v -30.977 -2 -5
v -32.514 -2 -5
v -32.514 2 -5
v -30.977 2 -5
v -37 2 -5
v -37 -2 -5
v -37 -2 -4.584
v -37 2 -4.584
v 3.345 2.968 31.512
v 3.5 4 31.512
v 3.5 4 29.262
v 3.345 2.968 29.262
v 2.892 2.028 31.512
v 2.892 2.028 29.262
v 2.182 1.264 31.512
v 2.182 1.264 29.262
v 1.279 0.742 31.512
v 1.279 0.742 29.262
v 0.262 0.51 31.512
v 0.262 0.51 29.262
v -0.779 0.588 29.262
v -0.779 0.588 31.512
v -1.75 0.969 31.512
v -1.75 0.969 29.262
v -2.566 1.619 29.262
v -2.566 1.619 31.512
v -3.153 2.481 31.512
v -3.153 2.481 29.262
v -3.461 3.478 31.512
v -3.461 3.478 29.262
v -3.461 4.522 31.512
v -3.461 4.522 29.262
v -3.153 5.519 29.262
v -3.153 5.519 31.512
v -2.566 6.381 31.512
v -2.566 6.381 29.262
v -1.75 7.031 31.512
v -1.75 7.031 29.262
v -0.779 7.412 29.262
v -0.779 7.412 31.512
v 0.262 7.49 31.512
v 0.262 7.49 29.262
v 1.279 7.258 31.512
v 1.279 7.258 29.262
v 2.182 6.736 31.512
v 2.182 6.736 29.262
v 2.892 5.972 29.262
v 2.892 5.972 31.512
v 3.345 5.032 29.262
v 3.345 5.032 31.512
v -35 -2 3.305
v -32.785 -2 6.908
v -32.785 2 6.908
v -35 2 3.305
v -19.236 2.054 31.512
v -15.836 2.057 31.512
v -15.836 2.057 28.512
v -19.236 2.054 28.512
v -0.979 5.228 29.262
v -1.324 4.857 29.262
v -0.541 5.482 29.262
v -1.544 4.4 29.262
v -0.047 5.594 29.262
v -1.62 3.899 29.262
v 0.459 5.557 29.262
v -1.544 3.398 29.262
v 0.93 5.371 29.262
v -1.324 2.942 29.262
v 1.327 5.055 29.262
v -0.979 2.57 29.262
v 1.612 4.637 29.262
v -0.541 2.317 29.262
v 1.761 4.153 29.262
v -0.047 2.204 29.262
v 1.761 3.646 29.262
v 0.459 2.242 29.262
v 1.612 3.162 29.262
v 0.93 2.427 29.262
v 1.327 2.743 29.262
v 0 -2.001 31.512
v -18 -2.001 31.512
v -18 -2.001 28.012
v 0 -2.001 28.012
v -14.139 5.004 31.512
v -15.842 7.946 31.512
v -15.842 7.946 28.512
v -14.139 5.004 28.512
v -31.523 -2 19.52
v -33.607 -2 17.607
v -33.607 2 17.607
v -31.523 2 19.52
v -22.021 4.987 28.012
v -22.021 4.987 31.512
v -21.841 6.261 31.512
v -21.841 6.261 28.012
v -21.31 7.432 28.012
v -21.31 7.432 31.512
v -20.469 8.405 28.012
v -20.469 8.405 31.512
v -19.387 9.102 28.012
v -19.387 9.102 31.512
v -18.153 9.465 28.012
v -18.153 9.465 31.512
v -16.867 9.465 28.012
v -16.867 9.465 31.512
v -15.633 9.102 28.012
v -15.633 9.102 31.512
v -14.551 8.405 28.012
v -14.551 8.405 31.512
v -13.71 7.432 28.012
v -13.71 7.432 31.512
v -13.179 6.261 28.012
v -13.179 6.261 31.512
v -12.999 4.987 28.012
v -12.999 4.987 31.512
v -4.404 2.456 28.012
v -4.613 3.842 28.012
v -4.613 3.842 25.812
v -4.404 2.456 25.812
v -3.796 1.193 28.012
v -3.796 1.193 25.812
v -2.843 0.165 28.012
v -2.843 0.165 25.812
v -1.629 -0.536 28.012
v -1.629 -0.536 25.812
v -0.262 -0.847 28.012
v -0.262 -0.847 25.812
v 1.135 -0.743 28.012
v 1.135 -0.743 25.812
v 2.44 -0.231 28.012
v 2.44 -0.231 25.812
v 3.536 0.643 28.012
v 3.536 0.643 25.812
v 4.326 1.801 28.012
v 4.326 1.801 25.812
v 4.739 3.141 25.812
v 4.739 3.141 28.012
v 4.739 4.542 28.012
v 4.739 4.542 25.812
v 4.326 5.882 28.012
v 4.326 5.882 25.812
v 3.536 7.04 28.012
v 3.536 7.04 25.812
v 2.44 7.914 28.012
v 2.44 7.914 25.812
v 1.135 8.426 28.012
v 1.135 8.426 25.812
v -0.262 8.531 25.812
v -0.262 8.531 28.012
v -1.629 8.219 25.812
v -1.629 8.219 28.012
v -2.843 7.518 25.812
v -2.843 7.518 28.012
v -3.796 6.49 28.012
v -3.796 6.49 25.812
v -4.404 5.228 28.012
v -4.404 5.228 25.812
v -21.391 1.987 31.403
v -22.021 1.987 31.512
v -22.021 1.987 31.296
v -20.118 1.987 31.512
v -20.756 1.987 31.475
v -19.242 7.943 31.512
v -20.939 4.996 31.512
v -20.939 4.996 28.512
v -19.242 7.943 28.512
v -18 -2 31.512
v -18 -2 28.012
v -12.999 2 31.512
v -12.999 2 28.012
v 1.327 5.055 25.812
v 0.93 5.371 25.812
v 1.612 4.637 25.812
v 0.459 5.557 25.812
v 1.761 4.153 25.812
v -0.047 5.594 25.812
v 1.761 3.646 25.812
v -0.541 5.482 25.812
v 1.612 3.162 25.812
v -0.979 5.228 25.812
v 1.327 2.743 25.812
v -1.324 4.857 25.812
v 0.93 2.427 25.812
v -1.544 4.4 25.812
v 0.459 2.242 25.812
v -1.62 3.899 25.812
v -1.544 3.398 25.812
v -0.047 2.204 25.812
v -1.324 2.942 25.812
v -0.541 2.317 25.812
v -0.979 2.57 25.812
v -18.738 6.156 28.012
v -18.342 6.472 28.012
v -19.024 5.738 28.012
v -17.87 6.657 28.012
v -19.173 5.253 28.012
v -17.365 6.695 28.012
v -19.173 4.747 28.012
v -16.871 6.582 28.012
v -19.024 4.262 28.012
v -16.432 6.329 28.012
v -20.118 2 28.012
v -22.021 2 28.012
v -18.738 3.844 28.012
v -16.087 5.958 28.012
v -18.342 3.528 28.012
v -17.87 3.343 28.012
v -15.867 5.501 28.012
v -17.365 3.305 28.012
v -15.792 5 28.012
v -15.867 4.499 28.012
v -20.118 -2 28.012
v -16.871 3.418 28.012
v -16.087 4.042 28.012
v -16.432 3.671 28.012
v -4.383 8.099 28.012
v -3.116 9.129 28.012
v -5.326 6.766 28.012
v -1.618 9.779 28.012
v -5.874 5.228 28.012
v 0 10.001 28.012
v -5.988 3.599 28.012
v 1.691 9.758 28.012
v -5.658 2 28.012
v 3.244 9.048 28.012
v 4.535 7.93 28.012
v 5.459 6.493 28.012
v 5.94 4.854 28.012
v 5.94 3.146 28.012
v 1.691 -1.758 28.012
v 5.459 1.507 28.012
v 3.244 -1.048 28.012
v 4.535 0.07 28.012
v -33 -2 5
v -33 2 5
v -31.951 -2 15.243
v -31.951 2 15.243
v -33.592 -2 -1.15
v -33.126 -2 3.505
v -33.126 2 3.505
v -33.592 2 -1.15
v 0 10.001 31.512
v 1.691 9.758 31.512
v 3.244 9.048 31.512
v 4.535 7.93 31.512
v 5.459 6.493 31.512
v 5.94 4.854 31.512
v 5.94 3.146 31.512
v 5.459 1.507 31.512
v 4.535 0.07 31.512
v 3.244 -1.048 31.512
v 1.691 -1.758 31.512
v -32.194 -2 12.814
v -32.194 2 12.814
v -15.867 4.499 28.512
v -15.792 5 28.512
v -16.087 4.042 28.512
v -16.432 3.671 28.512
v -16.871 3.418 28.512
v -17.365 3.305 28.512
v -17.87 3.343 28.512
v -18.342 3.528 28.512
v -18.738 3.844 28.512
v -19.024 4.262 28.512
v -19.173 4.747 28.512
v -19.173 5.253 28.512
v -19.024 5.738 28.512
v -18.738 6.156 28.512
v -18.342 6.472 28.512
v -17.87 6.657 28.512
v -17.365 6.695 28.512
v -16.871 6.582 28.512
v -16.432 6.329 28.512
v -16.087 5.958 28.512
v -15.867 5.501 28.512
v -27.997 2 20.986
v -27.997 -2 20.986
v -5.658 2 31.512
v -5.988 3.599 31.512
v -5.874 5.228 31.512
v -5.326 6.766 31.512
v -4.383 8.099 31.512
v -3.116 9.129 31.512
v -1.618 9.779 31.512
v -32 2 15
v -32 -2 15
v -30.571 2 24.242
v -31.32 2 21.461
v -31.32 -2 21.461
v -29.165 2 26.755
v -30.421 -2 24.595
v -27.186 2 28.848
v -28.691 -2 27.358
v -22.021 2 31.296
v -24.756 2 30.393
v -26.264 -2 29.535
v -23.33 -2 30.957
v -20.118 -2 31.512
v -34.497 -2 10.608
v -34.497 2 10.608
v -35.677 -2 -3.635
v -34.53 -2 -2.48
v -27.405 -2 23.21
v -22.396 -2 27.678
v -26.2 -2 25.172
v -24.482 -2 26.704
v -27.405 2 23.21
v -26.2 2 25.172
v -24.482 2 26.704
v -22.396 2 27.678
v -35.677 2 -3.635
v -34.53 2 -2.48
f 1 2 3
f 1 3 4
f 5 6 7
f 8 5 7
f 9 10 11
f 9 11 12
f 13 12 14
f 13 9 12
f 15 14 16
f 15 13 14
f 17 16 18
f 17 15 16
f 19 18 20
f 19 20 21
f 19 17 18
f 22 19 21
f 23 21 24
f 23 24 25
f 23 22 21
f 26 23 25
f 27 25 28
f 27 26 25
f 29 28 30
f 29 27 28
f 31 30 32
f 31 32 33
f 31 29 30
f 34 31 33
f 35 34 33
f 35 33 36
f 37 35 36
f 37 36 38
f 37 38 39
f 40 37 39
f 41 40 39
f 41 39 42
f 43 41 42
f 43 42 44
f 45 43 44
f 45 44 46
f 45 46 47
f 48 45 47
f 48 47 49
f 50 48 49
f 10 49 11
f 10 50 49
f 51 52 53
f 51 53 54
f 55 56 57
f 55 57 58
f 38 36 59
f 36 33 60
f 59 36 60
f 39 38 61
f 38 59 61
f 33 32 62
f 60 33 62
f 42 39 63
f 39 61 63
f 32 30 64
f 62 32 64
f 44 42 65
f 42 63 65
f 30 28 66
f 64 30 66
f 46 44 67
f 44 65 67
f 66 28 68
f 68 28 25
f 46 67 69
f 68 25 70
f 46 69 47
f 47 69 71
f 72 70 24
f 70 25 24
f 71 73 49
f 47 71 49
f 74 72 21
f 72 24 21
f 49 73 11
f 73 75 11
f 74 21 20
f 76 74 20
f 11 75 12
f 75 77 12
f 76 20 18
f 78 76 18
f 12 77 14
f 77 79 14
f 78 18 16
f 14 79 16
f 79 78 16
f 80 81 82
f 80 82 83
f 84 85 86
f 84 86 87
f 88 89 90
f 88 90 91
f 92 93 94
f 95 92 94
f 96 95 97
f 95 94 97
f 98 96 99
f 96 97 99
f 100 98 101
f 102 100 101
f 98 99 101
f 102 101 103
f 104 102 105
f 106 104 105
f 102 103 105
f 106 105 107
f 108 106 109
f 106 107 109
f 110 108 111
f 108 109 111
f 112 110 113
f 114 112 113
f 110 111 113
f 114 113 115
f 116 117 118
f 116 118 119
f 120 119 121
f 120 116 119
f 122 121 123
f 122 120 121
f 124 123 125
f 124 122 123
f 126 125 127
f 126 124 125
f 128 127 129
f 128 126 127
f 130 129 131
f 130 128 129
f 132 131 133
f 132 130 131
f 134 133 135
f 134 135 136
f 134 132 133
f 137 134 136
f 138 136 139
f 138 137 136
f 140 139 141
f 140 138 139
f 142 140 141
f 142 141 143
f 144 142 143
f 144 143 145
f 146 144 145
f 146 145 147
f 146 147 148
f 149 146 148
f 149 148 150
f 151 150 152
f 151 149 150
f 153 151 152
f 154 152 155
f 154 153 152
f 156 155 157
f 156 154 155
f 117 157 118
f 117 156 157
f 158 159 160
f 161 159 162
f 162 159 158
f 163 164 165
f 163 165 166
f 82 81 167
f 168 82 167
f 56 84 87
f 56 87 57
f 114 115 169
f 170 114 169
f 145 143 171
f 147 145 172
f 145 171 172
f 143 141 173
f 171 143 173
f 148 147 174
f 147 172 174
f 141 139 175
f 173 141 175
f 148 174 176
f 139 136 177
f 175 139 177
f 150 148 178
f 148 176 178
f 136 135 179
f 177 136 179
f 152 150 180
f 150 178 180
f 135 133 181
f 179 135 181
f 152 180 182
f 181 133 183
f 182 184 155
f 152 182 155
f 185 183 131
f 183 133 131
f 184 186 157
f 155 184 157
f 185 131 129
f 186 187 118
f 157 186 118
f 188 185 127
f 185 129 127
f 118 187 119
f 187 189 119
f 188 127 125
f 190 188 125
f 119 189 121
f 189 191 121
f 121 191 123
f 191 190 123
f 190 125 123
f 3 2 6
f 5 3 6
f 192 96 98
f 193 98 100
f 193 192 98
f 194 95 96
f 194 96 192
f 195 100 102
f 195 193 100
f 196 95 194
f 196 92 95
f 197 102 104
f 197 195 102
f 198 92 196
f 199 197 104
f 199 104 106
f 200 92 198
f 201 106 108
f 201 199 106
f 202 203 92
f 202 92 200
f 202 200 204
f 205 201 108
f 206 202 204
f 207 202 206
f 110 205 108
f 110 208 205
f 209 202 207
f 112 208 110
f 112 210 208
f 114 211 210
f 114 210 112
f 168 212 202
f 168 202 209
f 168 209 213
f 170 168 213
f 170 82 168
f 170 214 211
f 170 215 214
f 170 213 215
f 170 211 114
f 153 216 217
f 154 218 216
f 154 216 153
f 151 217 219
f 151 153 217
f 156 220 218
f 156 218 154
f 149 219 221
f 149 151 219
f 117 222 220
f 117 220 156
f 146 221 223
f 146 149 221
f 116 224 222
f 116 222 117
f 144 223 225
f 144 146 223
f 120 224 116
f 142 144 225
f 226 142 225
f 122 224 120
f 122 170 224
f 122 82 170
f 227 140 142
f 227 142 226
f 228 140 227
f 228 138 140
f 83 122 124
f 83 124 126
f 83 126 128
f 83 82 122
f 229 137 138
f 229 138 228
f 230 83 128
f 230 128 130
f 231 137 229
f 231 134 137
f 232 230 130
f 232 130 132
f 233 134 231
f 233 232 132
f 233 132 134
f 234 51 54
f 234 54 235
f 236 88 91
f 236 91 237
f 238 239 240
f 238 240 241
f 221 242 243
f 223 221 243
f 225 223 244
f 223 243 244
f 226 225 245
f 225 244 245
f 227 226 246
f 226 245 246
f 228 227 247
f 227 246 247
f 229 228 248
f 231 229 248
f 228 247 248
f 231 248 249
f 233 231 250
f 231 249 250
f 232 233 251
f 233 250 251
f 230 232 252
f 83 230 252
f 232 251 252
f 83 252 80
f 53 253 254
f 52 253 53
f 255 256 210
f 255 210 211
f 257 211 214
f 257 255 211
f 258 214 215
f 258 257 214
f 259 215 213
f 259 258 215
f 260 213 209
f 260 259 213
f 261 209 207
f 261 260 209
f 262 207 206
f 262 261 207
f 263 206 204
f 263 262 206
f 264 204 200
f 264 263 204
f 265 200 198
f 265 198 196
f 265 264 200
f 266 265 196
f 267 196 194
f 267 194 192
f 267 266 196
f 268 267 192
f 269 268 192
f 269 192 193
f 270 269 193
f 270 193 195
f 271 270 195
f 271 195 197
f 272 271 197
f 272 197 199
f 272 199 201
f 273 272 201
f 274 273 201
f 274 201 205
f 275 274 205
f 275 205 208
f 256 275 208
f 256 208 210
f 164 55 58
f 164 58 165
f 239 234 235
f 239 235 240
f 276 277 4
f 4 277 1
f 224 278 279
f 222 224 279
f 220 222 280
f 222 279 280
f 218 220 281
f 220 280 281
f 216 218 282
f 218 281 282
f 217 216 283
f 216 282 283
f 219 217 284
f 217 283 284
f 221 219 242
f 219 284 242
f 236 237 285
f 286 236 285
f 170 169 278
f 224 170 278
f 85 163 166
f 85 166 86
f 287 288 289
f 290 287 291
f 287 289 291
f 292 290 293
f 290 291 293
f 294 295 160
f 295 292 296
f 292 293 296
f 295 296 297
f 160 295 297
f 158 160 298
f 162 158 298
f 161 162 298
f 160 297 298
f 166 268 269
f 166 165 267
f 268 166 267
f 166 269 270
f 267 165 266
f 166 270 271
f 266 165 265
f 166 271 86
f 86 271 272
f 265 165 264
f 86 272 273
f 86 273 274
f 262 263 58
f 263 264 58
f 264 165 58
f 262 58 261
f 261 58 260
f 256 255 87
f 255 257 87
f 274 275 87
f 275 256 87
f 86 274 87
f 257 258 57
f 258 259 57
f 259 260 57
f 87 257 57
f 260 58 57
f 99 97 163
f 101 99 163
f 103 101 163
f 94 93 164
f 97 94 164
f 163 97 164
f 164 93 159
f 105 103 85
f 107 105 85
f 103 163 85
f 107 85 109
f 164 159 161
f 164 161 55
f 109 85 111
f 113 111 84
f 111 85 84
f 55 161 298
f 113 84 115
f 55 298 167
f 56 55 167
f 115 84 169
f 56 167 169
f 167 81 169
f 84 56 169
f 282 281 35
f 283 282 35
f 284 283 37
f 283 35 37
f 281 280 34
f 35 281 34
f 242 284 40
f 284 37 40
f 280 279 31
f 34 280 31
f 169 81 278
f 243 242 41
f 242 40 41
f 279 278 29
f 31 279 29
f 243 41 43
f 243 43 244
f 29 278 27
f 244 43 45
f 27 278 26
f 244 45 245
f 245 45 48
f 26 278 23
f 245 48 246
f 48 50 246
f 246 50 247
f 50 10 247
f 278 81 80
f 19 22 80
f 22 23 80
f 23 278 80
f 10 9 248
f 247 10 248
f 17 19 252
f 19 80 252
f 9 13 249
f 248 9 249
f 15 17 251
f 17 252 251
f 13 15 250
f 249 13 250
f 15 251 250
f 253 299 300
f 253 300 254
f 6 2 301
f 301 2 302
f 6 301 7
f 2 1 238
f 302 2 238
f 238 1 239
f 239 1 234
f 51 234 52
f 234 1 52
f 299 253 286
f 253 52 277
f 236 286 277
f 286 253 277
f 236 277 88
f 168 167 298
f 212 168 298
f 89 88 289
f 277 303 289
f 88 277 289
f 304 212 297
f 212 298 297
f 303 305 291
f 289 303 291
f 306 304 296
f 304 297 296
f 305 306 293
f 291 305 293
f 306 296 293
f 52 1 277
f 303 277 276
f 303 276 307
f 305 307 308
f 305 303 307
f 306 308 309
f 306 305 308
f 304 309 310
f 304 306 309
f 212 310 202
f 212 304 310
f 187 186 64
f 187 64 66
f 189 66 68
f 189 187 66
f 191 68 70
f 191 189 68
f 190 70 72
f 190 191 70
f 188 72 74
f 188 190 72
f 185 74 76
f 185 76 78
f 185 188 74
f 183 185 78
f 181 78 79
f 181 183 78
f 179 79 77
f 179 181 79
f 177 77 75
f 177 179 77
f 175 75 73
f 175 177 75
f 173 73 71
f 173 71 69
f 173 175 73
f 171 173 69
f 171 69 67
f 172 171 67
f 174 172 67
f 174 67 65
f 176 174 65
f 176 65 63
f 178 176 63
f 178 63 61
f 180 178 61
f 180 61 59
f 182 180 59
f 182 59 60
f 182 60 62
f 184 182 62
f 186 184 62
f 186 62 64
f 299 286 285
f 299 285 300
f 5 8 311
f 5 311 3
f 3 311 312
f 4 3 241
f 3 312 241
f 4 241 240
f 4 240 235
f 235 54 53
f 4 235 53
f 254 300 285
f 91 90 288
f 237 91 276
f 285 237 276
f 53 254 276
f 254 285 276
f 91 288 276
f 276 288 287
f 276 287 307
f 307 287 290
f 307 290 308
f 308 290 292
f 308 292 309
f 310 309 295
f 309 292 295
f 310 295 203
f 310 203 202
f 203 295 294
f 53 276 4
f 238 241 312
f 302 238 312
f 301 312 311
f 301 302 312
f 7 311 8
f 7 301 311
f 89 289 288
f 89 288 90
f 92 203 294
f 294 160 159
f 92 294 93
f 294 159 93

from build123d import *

# Parameters (mm, degrees)
PAD022_DEPTH       = 2
PAD023_DEPTH       = 3.5
SKETCH036_R        = 3.5
POCKET003017_DEPTH = 2.25
SKETCH037_R        = 4.702209
PAD024_DEPTH       = 2.2
SKETCH038_R        = 1.7
POCKET003018_DEPTH = 5
PAD027_DEPTH       = 3.5
SKETCH044_R        = 1.7
POCKET003021_DEPTH = 5
POCKET003037_DEPTH = 3
PAD042_DEPTH       = 4


with BuildPart() as v4_non_servo_sg90_leg:
    # Sketch034 → Pad022 (new body, symmetric)
    with BuildSketch(Plane.XZ):
        with BuildLine():
            Line((0, 28.012352), (20.118014, 28.012352))
            ThreePointArc((27.996705, 20.985645), (25.39647, 26.000475), (20.118014, 28.012352))
            Line((27.996705, 20.985645), (30.977077, -4.999855))
            Line((33.977077, -4.999855), (30.977077, -4.999855))
            Line((31.375086, 21.001563), (33.977077, -4.999855))
            ThreePointArc((31.375086, 21.001563), (27.724484, 28.375327), (20.118014, 31.512352))
            Line((0, 31.512352), (20.118014, 31.512352))
            Line((0, 28.012352), (0, 31.512352))
        make_face()
    extrude(amount=PAD022_DEPTH, both=True)

    # Sketch035 → Pad023 (new body)
    with BuildSketch(Plane(origin=(0, 0, 31.512352), x_dir=(-1, 0, 0), z_dir=(0, 0, 1))):
        with BuildLine():
            Line((-18, 2.000987), (0, 2.000987))
            ThreePointArc((2e-06, -10.000993), (6.00099, -4.000002), (0, 2.000987))
            ThreePointArc((-5.657903, -2), (-4.899687, -7.464818), (2e-06, -10.000993))
            Line((-18, -2), (-5.657903, -2))
            Line((-18, 2.000987), (-18, -2))
        make_face()
    extrude(amount=-PAD023_DEPTH)

    # Sketch036 → Pocket003017 (cut)
    with BuildSketch(Plane(origin=(0, 0, 31.512352), x_dir=(-1, 0, 0), z_dir=(0, 0, 1))):
        with Locations((0, -4)):
            Circle(SKETCH036_R)
    extrude(amount=-POCKET003017_DEPTH, mode=Mode.SUBTRACT)

    # Sketch037 → Pad024 (new body)
    with BuildSketch(Plane(origin=(0, 0, 28.012352), x_dir=(1, 0, 0), z_dir=(0, 0, -1))):
        with Locations((-0.089106, -3.841625)):
            Circle(SKETCH037_R)
    extrude(amount=PAD024_DEPTH)

    # Sketch038 → Pocket003018 (cut)
    with BuildSketch(Plane(origin=(0, 0, 25.812352), x_dir=(1, 0, 0), z_dir=(0, 0, -1))):
        with Locations((-0.080471, -3.899184)):
            Circle(SKETCH038_R)
    extrude(amount=-POCKET003018_DEPTH, mode=Mode.SUBTRACT)

    # Sketch043 → Pad027 (new body)
    with BuildSketch(Plane(origin=(0, 0, 31.512352), x_dir=(-1, 0, 0), z_dir=(0, 0, 1))):
        with BuildLine():
            Line((-22.021201, -1.987049), (-22.021201, -4.986919))
            ThreePointArc((-22.021201, -4.986919), (-17.510002, -9.511218), (-12.998803, -4.986919))
            Line((-12.998803, -4.986919), (-12.998803, -1.987049))
            Line((-22.021201, -1.987049), (-12.998803, -1.987049))
        make_face()
    extrude(amount=-PAD027_DEPTH)

    # Sketch044 → Pocket003021 (cut)
    with BuildSketch(Plane(origin=(0, 0, 31.512352), x_dir=(-1, 0, 0), z_dir=(0, 0, 1))):
        with Locations((-17.491917, -5)):
            Circle(SKETCH044_R)
    extrude(amount=-POCKET003021_DEPTH, mode=Mode.SUBTRACT)

    # Sketch071 → Pocket003037 (cut)
    with BuildSketch(Plane(origin=(0, 0, 31.512352), x_dir=(-1, 0, 0), z_dir=(0, 0, 1))):
        Polygon((-14.138998, -5.003928), (-15.835596, -2.057479), (-19.235593, -2.053552), (-20.938994, -4.996072), (-19.242396, -7.942521), (-15.842399, -7.946448), align=None)
    extrude(amount=-POCKET003037_DEPTH, mode=Mode.SUBTRACT)

    # Sketch072 → Pad042 (new body)
    with BuildSketch(Plane.XZ.offset(2)):
        with BuildLine():
            Line((27, 28.536497), (32.513573, -5))
            Line((32.513573, -5), (37.000002, -5))
            Line((37.000002, -5), (37.000002, -4.583553))
            ThreePointArc((33.505627, -1), (35.019116, -3.019659), (37.000002, -4.583553))
            Line((33, 5), (33.505627, -1))
            Line((35, 3.304739), (33, 5))
            Line((32.728943, 7), (35, 3.304739))
            Line((32, 13), (32.728943, 7))
            Line((34.496559, 10.608005), (32, 13))
            Line((32, 15), (34.496559, 10.608005))
            Line((31, 20), (32, 15))
            Line((33.606815, 17.606869), (31, 20))
            Line((31, 22), (33.606815, 17.606869))
            Line((27, 28.536497), (31, 22))
        make_face()
    extrude(amount=-PAD042_DEPTH)


with BuildPart() as part_mirroring011:
    # Part__Mirroring011: instance of V4_non_servo_SG90_leg
    add(v4_non_servo_sg90_leg.part.mirror(Plane(origin=(0, 0, 0), x_dir=(0, -1, 0), z_dir=(1, 0, 0))))


solid = part_mirroring011.part
